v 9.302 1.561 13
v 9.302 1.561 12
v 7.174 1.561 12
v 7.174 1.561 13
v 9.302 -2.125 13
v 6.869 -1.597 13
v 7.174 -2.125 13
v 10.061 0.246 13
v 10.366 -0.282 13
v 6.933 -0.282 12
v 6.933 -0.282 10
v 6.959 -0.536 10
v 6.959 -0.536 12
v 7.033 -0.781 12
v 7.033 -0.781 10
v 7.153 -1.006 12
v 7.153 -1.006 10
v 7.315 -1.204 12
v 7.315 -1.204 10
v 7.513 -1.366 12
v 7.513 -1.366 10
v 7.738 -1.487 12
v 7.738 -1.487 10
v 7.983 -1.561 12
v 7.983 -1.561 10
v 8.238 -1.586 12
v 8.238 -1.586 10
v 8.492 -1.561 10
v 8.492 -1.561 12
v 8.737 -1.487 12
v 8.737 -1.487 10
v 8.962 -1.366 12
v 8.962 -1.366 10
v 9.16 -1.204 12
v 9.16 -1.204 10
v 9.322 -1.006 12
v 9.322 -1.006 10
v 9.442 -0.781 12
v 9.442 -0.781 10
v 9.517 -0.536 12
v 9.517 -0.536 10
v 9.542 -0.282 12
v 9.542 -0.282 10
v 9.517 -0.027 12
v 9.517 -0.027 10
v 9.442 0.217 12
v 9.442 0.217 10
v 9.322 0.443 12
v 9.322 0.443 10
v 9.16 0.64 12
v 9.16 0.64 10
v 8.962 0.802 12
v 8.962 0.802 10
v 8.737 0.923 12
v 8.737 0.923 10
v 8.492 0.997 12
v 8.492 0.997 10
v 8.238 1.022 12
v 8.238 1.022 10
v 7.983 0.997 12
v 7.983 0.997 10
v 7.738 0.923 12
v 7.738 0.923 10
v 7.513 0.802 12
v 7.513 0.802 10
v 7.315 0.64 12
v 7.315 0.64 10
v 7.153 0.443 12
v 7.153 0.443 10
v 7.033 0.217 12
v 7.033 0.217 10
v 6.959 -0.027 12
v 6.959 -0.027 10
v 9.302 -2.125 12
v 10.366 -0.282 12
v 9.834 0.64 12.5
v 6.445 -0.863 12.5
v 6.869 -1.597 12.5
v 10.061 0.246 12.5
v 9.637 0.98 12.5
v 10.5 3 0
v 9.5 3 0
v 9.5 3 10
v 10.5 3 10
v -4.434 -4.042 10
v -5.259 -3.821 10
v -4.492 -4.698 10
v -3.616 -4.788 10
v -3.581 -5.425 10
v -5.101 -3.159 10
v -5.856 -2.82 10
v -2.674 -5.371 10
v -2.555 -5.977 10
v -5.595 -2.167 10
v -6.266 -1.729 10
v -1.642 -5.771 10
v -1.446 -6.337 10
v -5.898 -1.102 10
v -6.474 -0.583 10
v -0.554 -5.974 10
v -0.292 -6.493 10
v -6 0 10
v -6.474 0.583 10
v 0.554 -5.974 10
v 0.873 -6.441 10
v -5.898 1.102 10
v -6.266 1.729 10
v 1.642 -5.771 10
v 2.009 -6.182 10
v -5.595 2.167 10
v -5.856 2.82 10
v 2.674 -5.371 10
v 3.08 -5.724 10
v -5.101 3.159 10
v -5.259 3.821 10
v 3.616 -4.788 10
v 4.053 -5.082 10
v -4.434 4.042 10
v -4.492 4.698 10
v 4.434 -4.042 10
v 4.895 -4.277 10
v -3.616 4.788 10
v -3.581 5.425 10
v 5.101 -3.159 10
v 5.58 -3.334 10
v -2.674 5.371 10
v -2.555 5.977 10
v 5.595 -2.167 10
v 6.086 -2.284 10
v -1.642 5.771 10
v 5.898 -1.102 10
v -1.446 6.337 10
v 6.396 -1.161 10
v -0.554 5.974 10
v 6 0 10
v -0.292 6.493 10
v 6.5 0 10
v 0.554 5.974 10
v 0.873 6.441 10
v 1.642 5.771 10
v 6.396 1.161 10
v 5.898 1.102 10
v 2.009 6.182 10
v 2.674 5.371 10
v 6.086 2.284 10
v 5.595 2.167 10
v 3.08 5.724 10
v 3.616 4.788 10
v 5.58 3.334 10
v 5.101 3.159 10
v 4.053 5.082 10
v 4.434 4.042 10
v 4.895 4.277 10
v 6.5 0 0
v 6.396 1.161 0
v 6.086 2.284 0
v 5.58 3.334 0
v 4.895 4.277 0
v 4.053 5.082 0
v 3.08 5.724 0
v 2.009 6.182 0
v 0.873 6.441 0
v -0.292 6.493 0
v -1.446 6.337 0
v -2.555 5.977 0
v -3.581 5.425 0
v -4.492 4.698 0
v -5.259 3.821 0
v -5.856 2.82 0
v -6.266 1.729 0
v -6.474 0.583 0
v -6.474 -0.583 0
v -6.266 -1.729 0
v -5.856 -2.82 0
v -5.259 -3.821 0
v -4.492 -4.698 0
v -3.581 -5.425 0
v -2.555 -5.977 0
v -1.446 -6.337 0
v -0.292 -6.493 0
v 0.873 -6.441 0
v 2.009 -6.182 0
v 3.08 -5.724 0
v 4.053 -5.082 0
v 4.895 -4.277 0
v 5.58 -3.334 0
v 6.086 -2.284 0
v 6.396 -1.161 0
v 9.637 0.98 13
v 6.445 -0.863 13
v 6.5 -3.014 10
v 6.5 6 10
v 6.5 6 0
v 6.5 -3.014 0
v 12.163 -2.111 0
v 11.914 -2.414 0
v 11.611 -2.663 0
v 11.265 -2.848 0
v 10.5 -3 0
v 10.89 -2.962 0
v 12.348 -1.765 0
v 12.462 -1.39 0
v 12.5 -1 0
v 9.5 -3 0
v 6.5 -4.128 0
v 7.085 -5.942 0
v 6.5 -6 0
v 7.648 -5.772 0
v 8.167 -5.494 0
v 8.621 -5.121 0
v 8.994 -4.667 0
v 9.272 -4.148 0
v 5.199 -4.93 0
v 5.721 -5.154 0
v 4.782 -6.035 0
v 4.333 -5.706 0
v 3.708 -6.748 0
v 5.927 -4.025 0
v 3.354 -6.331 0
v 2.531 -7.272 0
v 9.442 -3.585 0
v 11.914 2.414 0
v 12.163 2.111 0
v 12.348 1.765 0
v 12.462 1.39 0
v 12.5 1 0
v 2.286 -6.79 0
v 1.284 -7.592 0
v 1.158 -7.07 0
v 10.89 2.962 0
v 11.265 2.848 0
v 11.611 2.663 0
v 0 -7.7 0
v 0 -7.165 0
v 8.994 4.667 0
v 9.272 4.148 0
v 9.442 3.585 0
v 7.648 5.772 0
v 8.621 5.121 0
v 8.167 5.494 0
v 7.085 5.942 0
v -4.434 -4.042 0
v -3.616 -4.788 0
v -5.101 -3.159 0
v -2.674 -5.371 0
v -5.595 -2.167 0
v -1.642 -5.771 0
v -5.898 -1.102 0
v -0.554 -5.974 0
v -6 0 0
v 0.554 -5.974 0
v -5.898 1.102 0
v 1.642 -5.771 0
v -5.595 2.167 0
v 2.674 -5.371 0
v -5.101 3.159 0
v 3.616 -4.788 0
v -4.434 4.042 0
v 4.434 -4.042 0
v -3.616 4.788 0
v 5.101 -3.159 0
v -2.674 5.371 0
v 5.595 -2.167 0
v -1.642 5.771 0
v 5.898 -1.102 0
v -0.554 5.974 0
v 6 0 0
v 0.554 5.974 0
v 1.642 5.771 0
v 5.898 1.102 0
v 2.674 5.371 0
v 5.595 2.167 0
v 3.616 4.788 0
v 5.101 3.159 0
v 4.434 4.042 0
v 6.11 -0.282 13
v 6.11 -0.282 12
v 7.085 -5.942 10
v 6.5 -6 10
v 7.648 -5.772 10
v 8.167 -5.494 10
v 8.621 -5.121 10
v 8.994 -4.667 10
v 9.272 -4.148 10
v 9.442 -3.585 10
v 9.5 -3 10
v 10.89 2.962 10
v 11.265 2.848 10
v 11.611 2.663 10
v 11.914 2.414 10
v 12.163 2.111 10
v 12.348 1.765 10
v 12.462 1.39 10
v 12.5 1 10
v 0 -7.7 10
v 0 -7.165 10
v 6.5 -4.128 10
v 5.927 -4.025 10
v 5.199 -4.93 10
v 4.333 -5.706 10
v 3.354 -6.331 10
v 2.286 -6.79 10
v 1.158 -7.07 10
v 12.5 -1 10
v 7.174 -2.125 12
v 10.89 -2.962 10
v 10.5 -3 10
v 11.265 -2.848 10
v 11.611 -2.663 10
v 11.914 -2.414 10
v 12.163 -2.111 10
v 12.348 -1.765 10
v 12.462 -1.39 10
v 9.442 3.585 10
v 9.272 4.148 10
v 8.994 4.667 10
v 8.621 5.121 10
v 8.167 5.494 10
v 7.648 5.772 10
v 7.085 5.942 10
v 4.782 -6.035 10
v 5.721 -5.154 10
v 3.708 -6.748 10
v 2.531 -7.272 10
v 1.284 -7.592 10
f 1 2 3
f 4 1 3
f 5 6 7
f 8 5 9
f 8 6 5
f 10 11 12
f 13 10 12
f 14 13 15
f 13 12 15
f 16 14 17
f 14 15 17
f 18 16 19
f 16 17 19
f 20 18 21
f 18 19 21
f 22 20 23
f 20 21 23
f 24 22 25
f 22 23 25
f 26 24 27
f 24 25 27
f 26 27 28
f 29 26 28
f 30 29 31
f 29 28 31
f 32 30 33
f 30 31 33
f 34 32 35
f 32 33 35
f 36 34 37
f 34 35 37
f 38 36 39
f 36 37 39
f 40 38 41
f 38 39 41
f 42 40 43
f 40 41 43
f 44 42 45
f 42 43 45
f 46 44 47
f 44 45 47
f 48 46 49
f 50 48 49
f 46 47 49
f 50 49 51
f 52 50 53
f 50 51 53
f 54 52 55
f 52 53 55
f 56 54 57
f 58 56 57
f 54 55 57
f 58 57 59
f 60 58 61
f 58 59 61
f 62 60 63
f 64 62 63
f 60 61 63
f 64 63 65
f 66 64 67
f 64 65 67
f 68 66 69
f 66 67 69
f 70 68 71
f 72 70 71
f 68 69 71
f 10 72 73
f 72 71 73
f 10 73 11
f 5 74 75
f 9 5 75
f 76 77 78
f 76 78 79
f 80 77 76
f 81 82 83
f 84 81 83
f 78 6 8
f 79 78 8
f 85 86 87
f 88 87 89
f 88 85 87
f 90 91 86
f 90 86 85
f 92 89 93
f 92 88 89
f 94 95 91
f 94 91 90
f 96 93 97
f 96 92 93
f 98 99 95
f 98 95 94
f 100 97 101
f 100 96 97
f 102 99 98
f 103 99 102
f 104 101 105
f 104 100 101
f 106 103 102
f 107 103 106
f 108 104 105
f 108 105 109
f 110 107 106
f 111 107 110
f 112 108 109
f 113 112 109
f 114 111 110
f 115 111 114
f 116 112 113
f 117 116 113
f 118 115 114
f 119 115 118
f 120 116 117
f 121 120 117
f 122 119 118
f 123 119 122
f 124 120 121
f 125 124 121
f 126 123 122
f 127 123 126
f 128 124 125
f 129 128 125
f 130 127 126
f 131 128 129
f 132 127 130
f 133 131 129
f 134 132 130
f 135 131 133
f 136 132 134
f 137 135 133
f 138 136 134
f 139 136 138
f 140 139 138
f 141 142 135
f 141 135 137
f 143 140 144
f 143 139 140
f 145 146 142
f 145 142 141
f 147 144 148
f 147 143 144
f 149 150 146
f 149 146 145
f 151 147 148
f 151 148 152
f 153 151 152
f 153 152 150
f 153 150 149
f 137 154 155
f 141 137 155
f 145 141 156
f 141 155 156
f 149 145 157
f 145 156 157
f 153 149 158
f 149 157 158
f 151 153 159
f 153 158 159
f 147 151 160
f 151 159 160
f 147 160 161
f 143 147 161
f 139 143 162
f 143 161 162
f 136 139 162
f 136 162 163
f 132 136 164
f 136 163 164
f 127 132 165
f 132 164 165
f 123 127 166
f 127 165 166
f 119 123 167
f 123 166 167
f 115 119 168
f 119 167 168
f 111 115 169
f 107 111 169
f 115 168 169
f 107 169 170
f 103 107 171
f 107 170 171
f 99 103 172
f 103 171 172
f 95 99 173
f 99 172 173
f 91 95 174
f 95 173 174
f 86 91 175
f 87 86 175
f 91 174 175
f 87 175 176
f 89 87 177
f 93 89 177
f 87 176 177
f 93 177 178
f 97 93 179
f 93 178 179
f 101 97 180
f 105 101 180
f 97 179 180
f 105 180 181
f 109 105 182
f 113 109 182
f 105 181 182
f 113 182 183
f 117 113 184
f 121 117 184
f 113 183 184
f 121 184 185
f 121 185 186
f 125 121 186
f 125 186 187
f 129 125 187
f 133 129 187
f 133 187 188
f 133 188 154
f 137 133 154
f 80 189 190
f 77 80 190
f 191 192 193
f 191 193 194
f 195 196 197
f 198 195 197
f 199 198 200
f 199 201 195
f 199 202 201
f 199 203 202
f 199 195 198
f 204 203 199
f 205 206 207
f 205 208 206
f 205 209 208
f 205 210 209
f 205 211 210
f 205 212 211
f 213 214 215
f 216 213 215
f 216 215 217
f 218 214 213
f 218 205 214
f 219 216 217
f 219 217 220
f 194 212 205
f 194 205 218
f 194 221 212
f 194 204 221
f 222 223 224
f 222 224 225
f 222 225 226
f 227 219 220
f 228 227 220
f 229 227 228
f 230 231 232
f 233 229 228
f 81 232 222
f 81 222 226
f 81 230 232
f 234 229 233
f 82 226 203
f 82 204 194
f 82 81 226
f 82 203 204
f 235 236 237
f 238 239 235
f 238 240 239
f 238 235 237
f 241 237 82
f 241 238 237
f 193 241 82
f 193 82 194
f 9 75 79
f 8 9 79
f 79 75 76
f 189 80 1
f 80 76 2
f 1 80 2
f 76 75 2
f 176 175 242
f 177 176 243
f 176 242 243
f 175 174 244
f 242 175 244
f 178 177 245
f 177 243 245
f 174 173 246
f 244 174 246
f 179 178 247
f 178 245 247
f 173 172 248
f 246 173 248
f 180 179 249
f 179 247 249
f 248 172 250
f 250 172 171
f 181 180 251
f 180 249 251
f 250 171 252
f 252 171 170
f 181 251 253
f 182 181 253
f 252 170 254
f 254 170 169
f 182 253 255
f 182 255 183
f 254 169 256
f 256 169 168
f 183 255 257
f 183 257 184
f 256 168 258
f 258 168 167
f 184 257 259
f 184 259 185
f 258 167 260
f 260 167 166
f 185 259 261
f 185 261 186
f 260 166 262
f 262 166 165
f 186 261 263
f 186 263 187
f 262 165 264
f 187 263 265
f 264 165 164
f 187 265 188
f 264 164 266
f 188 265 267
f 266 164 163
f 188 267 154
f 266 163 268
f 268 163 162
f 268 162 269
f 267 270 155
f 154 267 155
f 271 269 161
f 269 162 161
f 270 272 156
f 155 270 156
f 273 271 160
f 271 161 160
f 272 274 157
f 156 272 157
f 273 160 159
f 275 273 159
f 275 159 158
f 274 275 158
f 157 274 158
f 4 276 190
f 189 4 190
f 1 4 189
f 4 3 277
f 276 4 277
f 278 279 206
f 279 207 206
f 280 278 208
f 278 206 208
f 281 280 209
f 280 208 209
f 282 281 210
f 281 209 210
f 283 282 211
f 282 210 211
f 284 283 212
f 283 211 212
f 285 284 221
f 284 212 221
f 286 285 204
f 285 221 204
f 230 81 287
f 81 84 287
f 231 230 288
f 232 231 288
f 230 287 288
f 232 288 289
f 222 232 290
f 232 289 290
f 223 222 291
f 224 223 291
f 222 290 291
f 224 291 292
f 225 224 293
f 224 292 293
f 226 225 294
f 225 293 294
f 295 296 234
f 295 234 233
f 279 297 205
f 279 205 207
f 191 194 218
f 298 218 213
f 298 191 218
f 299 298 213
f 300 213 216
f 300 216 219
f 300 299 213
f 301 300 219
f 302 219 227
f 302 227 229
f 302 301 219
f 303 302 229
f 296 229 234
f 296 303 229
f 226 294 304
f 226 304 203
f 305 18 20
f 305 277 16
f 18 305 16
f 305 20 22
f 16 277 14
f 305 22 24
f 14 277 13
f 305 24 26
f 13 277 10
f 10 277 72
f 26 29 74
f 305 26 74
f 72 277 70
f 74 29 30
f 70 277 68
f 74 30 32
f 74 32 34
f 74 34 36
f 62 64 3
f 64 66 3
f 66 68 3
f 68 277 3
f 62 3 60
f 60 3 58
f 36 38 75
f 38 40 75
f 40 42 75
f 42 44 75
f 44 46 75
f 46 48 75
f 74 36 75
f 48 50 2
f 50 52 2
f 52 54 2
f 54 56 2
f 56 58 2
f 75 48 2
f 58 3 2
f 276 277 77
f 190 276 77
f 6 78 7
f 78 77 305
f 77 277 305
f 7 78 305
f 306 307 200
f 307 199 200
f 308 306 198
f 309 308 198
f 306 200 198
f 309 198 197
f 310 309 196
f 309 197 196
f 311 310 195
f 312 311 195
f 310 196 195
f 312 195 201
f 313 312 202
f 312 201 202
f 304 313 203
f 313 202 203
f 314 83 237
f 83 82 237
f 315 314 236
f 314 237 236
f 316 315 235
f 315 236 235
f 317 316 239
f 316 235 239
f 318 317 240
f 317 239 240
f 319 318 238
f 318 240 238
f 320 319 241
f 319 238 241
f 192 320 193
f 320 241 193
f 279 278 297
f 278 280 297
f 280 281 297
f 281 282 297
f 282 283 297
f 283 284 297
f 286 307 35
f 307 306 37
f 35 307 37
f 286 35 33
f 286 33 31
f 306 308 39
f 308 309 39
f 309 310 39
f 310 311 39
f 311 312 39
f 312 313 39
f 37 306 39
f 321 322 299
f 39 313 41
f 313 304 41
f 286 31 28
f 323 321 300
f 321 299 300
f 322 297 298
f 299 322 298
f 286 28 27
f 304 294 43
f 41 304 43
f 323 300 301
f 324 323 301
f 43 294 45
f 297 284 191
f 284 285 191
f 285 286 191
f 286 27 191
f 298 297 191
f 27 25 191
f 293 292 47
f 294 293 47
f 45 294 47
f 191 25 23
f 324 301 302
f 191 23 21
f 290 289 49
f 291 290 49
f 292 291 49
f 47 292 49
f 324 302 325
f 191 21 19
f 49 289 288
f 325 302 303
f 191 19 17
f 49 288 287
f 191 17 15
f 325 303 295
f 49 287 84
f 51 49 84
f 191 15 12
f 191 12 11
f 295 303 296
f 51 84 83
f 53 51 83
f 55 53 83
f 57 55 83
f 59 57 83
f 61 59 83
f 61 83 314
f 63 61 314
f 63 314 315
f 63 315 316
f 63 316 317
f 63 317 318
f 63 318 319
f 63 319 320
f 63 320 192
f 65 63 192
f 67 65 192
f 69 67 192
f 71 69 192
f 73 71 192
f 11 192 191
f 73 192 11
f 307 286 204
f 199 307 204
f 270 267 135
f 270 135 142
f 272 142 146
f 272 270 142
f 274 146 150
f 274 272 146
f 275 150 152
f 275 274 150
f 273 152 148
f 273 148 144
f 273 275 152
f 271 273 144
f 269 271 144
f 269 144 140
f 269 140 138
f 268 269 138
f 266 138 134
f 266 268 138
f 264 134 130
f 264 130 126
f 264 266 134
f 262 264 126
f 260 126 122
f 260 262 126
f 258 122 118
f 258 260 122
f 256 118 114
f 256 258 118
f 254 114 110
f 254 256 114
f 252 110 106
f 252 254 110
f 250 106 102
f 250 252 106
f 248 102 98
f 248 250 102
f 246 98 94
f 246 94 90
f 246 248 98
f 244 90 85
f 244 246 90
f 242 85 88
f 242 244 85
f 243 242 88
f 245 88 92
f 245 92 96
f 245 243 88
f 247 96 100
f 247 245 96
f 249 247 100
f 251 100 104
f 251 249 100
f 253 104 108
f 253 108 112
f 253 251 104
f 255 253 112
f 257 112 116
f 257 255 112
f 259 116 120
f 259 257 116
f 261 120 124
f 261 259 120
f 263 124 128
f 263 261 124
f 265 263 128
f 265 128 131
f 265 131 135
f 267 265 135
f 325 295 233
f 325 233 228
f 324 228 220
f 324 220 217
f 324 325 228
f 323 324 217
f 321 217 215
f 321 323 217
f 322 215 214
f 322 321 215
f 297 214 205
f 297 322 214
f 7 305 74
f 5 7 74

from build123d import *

# Parameters (mm, degrees)
ESBO_O1_R                = 6.5
ESBO_O1_R_2              = 6
RESSALTO_EXTRUS_O1_DEPTH = 10
RESSALTO_EXTRUS_O2_DEPTH = 10
RESSALTO_EXTRUS_O3_DEPTH = 3
FILETE1_R                = 2
FILETE2_R                = 3
ESBO_O4_R                = 1.304081641
RESSALTO_EXTRUS_O4_DEPTH = 2
RESSALTO_EXTRUS_O5_DEPTH = 1
CORTE_EXTRUS_O1_DEPTH    = 0.5
RESSALTO_EXTRUS_O6_DEPTH = 10


with BuildPart() as part:
    # Esboço1 → Ressalto-extrusão1 (new body)
    with BuildSketch(Plane.XY):
        Circle(ESBO_O1_R)
        Circle(ESBO_O1_R_2, mode=Mode.SUBTRACT)
    extrude(amount=RESSALTO_EXTRUS_O1_DEPTH)


with BuildPart() as body_2:
    # Esboço2 → Ressalto-extrusão2 (new body)
    with BuildSketch(Plane.XY.offset(10)):
        Polygon((6.5, 0), (6.5, 6), (9.5, 6), (9.5, -6), (6.5, -6), align=None)
    extrude(amount=-RESSALTO_EXTRUS_O2_DEPTH)

    # Esboço3 → Ressalto-extrusão3 (add)
    with BuildSketch(Plane(origin=(9.5, 0, 0), x_dir=(0, 0, -1), z_dir=(1, 0, 0))):
        Polygon((0, 0), (0, 3), (-10, 3), (-10, -3), (0, -3), align=None)
    extrude(amount=RESSALTO_EXTRUS_O3_DEPTH)

    # Filete1
    filete1_edges = [body_2.edges().sort_by_distance(p)[0] for p in [
        (12.5, -3, 5),
        (12.5, 3, 5),
    ]]
    fillet(filete1_edges, radius=FILETE1_R)

    # Filete2
    filete2_edges = [body_2.edges().sort_by_distance(p)[0] for p in [
        (9.5, -6, 5),
        (9.5, 6, 5),
    ]]
    fillet(filete2_edges, radius=FILETE2_R - 0.0001)  # a hair under: the kernel refuses the full size

    # Esboço4 → Ressalto-extrusão4 (add)
    with BuildSketch(Plane.XY.offset(10)):
        with Locations(Location((8.237547689, -0.281806099, 0), (0, 0, 180))):
            Circle(ESBO_O4_R)
    extrude(amount=RESSALTO_EXTRUS_O4_DEPTH)

    # Esboço5 → Ressalto-extrusão5 (add)
    with BuildSketch(Plane.XY.offset(12)):
        Polygon((10.365558356, -0.281806099), (9.301553023, 1.561105198), (7.173542356, 1.561105198), (6.109537022, -0.281806099), (7.173542356, -2.124717396), (9.301553023, -2.124717396), align=None)
    extrude(amount=RESSALTO_EXTRUS_O5_DEPTH)

    # Esboço6 → Corte-extrusão1 (cut)
    with BuildSketch(Plane.XY.offset(13)):
        Polygon((10.061017875, 0.245673487), (9.833555689, 0.63964955), (9.637214047, 0.979723249), (6.445198047, -0.863188048), (6.869001875, -1.59723781), align=None)
    extrude(amount=-CORTE_EXTRUS_O1_DEPTH, mode=Mode.SUBTRACT)

    # Esboço7 → Ressalto-extrusão6 (add)
    with BuildSketch(Plane.XY.offset(10)):
        with BuildLine():
            ThreePointArc((0, -7.699972578), (3.708425738, -6.748122424), (6.5, -4.127902337))
            Line((6.5, -4.127902337), (6.5, -3.013766987))
            ThreePointArc((6.5, -3.013766987), (3.856169306, -6.038439346), (0, -7.164690604))
            Line((0, -7.164690604), (0, -7.699972578))
        make_face()
    extrude(amount=-RESSALTO_EXTRUS_O6_DEPTH)


solid = Compound([part.part, body_2.part])
